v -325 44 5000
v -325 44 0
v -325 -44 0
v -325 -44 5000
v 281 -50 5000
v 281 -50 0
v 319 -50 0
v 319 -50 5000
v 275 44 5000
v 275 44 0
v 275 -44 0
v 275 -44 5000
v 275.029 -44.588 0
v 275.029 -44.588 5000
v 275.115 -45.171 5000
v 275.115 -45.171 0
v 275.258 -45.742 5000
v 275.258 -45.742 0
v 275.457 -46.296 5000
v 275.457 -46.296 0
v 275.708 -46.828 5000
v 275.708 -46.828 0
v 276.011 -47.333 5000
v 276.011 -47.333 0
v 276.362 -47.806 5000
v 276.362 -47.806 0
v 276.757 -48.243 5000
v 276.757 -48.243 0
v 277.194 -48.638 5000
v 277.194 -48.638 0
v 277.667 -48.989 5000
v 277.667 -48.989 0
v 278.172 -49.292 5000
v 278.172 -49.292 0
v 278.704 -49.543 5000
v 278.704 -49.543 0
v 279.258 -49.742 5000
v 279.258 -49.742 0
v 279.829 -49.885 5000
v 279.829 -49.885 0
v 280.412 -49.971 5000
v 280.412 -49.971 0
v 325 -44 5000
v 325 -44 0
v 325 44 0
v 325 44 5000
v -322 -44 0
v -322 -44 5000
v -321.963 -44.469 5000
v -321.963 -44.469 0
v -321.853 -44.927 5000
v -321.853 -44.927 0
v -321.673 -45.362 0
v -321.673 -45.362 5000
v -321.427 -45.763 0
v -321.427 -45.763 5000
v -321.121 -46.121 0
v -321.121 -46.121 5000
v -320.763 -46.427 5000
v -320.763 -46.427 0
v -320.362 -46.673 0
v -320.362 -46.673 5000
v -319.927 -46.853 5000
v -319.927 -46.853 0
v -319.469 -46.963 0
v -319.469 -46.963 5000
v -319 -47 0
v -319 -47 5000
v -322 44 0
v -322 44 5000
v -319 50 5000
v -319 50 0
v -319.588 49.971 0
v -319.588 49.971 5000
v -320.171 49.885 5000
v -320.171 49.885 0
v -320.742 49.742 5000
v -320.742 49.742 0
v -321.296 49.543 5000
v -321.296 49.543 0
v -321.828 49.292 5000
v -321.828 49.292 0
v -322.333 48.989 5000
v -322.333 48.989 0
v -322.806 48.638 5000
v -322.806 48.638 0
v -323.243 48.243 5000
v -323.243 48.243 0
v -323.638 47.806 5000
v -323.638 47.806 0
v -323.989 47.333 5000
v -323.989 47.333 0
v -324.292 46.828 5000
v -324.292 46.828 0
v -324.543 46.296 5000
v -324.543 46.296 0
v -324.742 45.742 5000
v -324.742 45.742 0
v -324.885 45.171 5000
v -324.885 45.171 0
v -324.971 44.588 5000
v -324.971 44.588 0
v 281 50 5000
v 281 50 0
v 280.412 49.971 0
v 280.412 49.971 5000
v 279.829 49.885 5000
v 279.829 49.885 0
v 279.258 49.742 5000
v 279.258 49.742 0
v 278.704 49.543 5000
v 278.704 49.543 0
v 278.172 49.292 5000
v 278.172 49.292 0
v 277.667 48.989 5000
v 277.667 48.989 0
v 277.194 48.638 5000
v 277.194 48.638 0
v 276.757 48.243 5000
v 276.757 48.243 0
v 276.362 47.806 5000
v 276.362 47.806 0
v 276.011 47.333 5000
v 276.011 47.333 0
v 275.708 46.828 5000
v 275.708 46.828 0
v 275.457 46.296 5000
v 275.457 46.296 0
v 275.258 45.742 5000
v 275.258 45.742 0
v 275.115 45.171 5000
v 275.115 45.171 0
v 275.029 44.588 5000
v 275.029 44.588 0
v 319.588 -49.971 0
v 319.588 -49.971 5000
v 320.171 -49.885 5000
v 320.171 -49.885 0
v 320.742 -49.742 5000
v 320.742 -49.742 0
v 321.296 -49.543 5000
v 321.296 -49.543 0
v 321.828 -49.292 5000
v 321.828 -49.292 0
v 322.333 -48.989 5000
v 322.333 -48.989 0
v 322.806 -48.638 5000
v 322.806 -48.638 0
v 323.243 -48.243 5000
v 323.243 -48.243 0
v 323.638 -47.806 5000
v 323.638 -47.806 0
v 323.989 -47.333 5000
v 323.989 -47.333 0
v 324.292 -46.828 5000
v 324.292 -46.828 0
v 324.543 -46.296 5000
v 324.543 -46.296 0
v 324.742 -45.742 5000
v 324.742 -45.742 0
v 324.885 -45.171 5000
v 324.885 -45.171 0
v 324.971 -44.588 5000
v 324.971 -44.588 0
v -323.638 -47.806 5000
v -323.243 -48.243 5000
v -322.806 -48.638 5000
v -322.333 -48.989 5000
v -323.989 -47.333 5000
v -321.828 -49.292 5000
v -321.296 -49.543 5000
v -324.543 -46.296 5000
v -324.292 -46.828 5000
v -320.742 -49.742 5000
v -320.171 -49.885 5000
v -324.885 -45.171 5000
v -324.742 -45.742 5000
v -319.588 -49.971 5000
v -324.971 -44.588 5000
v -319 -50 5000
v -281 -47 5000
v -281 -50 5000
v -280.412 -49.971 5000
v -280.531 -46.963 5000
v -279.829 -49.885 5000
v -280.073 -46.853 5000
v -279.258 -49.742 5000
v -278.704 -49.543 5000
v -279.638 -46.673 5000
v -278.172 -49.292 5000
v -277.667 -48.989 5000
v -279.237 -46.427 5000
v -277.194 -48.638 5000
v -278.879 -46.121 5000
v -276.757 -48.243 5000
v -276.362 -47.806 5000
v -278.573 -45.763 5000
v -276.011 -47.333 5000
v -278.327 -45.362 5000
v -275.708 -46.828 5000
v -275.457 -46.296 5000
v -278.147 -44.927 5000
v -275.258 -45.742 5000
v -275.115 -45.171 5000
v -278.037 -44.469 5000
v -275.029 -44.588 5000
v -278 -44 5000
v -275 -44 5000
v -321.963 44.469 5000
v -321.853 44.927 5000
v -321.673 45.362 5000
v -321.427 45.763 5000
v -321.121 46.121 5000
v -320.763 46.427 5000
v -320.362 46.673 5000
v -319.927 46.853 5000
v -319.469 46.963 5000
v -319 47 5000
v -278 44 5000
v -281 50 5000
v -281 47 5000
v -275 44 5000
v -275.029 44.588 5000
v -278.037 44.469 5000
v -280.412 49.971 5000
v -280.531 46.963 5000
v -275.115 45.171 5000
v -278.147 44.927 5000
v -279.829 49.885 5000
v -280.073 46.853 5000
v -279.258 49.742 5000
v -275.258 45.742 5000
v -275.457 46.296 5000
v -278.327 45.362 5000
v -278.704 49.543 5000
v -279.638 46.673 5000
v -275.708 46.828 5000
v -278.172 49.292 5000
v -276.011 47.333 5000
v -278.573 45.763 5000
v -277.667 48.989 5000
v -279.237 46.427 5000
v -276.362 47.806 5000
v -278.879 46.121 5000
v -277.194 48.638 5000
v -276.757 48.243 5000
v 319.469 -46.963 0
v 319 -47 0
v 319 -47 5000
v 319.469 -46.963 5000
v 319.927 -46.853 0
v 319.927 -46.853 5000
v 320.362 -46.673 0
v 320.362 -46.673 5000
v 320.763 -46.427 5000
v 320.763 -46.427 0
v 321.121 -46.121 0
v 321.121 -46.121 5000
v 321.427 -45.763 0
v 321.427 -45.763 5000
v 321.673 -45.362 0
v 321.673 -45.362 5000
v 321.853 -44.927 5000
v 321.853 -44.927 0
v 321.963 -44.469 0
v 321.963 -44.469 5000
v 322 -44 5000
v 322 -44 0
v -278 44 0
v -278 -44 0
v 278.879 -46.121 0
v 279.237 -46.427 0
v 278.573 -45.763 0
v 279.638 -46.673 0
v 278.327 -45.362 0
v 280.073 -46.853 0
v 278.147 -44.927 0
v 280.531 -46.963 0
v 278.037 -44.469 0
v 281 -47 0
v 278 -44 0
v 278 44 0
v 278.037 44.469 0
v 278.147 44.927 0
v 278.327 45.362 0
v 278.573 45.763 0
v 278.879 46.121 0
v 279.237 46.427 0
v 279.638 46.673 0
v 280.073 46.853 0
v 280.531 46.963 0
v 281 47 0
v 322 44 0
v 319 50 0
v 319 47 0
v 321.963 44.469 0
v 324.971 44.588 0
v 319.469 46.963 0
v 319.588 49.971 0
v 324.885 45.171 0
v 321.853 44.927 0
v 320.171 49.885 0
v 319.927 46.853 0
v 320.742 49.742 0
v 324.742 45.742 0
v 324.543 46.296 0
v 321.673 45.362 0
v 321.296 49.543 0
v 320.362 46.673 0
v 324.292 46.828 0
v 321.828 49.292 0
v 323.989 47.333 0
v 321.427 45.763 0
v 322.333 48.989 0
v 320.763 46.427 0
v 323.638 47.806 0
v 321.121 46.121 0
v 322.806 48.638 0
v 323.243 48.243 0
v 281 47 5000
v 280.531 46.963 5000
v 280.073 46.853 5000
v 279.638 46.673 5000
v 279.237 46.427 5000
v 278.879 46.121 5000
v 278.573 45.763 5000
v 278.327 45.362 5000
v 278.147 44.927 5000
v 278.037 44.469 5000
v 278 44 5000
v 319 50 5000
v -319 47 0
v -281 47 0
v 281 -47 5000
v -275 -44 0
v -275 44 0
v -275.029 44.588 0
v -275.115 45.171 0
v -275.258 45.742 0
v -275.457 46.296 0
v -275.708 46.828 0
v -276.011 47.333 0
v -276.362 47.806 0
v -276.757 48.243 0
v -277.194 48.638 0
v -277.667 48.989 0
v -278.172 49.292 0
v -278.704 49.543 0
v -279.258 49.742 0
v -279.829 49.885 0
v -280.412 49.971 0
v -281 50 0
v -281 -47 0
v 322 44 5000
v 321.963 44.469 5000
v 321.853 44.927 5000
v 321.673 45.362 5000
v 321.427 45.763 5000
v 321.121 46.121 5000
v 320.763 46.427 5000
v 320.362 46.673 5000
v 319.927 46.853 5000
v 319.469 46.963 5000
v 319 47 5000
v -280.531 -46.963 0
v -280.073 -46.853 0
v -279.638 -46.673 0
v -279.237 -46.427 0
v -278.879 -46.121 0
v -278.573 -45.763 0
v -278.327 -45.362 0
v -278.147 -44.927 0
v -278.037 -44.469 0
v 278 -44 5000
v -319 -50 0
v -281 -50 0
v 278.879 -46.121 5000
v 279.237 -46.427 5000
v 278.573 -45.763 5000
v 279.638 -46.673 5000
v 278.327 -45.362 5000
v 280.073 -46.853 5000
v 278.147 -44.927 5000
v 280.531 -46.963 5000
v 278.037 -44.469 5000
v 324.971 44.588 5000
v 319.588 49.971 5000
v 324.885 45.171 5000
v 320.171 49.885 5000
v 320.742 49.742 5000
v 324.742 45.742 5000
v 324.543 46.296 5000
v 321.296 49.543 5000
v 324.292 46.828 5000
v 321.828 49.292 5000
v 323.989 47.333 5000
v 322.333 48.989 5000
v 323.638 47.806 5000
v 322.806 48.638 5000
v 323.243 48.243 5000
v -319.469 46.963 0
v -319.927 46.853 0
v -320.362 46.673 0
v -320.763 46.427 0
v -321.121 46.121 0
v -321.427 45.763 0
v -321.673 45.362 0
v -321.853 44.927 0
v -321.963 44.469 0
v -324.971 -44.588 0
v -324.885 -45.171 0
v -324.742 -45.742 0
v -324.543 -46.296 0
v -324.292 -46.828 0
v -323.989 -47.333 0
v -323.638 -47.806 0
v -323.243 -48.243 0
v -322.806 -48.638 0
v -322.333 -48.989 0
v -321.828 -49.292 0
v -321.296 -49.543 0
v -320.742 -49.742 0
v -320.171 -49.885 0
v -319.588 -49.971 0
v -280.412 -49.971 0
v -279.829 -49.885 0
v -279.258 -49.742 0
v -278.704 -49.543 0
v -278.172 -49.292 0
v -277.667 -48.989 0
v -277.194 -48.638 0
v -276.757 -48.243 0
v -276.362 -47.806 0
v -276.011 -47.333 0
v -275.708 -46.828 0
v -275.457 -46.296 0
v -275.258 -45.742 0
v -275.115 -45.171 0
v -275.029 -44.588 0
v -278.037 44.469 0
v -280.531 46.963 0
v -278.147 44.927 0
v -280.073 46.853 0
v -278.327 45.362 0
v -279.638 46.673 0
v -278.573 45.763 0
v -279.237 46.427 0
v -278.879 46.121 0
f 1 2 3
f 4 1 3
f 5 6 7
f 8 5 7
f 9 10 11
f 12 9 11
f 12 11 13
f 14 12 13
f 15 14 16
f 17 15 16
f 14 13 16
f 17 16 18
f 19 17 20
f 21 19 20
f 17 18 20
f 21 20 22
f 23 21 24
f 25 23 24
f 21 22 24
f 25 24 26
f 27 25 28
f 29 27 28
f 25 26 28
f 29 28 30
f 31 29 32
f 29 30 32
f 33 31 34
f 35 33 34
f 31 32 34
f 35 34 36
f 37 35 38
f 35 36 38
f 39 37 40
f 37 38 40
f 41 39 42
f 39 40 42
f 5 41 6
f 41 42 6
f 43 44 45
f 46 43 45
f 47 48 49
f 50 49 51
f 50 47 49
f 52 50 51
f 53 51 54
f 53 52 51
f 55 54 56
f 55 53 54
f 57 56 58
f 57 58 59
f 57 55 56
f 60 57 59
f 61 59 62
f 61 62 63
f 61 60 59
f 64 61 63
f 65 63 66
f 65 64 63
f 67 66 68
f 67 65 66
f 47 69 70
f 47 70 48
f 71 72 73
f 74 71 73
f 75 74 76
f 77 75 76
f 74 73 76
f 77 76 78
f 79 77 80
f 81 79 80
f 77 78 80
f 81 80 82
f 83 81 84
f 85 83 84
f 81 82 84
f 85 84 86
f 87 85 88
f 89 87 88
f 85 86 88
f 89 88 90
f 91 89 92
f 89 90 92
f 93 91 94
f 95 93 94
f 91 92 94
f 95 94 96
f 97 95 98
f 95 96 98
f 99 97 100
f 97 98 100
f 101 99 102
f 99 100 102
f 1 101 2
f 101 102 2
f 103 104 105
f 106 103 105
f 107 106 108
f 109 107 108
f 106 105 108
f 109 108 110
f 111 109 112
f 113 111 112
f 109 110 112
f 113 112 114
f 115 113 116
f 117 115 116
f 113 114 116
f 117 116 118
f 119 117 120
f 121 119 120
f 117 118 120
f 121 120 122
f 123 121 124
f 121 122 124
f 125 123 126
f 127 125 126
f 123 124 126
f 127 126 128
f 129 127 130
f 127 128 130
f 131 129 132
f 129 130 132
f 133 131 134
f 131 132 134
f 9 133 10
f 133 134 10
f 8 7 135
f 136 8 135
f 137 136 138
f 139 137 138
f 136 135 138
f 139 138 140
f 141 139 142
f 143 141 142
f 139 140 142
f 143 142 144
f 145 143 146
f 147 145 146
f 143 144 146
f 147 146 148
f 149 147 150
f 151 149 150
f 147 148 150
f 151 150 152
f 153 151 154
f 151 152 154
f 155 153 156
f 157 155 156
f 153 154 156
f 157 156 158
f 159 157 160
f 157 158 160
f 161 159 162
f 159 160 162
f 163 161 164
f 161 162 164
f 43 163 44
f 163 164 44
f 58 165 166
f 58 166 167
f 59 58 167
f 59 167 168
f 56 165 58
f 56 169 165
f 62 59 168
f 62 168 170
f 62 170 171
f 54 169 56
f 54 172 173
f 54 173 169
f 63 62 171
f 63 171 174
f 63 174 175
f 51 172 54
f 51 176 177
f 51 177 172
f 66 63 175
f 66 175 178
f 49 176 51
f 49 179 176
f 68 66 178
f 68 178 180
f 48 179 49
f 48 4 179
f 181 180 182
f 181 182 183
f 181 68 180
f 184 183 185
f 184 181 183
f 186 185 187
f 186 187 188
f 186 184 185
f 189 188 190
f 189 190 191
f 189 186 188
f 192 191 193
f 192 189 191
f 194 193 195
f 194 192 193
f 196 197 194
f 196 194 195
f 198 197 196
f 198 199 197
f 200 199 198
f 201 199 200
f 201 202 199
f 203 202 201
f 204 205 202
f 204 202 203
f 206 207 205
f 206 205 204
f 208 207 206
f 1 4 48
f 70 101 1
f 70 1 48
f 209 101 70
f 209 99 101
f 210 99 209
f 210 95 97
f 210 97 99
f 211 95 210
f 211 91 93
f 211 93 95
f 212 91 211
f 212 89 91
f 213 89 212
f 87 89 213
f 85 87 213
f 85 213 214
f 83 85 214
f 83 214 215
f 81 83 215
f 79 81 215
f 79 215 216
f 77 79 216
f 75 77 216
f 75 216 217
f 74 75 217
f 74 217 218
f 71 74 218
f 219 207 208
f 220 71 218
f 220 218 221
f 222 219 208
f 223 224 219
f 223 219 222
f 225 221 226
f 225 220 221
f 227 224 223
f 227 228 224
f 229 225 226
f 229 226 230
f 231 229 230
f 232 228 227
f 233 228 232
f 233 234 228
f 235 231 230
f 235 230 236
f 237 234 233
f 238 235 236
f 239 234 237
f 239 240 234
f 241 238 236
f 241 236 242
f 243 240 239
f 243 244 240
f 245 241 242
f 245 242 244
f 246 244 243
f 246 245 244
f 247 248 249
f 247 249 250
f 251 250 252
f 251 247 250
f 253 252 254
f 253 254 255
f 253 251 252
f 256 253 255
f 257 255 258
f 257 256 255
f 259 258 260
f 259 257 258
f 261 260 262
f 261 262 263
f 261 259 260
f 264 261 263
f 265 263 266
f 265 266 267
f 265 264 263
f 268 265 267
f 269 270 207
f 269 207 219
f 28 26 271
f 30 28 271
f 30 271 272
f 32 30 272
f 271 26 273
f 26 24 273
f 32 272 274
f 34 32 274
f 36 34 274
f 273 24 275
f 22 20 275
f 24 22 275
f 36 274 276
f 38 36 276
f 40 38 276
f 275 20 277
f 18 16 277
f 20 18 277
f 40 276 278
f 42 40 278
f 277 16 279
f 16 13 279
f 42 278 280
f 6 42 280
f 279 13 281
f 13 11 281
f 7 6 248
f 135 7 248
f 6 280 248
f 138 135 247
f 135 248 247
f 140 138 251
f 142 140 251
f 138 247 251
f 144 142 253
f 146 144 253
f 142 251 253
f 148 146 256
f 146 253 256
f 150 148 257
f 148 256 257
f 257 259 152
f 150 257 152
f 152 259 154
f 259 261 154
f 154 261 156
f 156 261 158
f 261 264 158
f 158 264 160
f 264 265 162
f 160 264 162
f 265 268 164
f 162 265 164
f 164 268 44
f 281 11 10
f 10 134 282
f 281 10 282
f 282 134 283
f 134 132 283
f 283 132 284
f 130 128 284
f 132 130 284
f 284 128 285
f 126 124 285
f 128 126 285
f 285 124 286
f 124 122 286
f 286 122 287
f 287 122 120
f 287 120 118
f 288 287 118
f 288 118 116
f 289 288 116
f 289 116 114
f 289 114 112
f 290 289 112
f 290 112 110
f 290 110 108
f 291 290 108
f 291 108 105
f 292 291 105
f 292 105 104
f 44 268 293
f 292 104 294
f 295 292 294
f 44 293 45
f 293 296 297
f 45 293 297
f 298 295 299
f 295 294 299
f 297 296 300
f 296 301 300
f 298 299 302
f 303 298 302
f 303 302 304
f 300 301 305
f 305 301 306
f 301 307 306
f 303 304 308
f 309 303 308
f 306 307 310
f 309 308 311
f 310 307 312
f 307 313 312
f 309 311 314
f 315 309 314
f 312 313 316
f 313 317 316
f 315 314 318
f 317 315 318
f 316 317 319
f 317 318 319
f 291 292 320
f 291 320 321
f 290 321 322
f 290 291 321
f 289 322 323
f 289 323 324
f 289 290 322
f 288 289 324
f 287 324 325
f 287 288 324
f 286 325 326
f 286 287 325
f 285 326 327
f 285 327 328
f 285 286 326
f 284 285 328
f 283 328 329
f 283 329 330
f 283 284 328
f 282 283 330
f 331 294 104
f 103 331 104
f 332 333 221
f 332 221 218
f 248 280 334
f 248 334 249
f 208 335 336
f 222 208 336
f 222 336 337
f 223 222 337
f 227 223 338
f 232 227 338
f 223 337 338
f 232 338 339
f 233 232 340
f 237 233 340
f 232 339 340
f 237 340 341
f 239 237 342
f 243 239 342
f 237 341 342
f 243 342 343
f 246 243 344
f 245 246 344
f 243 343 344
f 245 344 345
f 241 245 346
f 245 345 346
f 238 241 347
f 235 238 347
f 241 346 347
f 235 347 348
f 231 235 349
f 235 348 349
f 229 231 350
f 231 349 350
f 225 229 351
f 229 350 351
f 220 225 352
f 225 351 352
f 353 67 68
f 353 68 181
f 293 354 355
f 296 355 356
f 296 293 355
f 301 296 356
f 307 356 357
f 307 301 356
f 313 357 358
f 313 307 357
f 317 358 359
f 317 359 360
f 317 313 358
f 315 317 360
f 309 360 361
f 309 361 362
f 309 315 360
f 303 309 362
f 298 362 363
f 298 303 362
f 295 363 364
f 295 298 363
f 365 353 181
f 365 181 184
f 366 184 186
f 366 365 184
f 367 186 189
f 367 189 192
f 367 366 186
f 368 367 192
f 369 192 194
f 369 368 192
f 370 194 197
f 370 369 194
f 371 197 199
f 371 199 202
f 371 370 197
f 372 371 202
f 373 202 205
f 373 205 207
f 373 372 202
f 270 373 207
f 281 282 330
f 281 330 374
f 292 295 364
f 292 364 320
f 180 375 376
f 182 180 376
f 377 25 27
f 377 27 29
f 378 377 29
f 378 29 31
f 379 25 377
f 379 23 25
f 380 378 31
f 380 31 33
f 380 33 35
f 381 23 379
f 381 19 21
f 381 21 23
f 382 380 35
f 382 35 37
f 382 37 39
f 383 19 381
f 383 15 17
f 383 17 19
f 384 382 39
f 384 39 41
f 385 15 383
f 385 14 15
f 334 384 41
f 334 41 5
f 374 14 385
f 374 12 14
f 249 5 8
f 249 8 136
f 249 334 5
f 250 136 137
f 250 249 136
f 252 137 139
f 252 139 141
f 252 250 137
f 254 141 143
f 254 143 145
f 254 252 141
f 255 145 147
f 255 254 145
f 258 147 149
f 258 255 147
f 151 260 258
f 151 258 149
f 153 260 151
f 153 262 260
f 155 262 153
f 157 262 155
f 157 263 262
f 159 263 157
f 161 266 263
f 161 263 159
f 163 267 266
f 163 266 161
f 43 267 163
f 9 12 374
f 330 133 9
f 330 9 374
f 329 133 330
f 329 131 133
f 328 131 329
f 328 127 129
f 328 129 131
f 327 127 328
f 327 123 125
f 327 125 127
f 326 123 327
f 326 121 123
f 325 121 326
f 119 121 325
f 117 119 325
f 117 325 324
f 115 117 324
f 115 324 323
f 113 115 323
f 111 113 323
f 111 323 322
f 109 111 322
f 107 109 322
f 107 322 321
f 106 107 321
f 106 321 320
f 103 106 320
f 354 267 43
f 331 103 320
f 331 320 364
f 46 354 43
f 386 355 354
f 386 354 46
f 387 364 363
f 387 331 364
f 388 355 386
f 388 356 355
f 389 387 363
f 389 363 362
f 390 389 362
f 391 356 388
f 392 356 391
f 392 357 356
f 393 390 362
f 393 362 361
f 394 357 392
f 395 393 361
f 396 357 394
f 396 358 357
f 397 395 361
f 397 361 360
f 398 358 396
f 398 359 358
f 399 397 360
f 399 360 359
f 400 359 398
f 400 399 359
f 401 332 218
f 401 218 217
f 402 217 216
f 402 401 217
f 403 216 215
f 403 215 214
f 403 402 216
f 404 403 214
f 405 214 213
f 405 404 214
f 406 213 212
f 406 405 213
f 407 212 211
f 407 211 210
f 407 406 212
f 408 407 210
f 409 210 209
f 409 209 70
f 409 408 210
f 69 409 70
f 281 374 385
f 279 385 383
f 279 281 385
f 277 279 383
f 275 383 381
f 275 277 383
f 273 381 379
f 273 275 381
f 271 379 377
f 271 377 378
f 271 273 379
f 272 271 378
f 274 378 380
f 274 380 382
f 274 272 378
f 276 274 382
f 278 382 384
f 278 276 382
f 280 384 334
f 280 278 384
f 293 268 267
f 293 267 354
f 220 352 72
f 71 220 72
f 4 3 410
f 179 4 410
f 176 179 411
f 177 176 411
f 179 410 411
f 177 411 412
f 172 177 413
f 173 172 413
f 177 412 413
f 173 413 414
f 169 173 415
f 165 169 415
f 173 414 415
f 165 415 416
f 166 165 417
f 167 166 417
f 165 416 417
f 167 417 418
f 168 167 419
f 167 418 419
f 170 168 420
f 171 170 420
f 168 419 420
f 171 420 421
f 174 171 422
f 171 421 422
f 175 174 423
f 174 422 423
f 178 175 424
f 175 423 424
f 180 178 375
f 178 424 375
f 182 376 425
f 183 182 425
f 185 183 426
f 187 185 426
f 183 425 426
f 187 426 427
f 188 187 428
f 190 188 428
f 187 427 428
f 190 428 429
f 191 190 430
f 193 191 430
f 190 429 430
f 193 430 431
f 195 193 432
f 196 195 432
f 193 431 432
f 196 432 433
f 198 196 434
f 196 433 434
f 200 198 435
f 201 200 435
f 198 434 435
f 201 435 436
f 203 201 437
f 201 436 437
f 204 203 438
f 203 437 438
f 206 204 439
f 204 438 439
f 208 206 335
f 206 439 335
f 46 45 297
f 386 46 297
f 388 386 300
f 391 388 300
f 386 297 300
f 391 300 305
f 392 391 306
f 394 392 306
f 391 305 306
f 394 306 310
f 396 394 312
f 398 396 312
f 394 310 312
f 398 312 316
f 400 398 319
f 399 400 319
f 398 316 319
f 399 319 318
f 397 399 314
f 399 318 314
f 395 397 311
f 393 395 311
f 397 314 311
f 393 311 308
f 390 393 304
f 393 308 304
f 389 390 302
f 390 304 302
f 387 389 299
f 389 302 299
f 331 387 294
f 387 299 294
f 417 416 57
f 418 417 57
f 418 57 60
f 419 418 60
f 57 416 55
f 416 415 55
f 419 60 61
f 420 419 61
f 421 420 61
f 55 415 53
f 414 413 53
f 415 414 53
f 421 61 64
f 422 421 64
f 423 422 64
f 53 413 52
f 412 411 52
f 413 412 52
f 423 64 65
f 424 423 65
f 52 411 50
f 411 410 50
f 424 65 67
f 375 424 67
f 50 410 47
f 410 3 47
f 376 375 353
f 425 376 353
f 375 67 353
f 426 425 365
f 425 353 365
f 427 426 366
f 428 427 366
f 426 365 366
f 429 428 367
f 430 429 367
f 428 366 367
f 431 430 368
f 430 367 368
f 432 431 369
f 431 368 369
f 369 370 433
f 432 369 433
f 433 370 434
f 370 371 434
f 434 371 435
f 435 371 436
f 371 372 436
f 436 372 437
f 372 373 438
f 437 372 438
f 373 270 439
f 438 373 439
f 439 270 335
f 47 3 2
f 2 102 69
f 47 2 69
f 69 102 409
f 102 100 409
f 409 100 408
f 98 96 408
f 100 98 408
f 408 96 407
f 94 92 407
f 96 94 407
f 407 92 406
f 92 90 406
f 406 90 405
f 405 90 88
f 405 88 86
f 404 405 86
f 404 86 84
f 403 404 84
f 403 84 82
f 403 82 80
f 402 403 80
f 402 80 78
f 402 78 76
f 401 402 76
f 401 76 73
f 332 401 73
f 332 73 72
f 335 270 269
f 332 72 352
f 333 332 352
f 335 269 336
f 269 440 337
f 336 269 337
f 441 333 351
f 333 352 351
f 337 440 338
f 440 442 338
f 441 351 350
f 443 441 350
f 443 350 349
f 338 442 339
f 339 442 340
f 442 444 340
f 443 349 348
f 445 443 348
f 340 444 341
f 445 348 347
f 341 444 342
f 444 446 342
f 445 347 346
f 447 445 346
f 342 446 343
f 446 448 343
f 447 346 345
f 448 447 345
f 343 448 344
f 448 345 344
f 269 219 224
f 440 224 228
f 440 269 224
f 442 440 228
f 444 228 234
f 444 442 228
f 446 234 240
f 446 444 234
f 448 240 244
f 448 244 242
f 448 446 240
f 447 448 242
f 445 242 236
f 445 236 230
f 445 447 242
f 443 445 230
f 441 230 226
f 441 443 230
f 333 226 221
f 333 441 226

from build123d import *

# Parameters (mm, degrees)
TWO_RAILS_PROTOTYPE_DEPTH   = 5000
TWO_RAILS_PROTOTYPE_2_DEPTH = 5000


with BuildPart() as part:
    # PROFILE_100_50_3_R6_FIXED → TWO_RAILS_PROTOTYPE (new body)
    with BuildSketch(Plane.XY):
        with BuildLine():
            Line((-319, -50), (-281, -50))
            ThreePointArc((-281, -50), (-276.757359313, -48.242640687), (-275, -44))
            Line((-275, -44), (-275, 44))
            ThreePointArc((-275, 44), (-276.757359313, 48.242640687), (-281, 50))
            Line((-281, 50), (-319, 50))
            ThreePointArc((-319, 50), (-323.242640687, 48.242640687), (-325, 44))
            Line((-325, 44), (-325, -44))
            ThreePointArc((-325, -44), (-323.242640687, -48.242640687), (-319, -50))
        make_face()
        with BuildLine():
            Line((-319, -47), (-281, -47))
            ThreePointArc((-281, -47), (-278.878679656, -46.121320344), (-278, -44))
            Line((-278, -44), (-278, 44))
            ThreePointArc((-278, 44), (-278.878679656, 46.121320344), (-281, 47))
            Line((-281, 47), (-319, 47))
            ThreePointArc((-319, 47), (-321.121320344, 46.121320344), (-322, 44))
            Line((-322, 44), (-322, -44))
            ThreePointArc((-322, -44), (-321.121320344, -46.121320344), (-319, -47))
        make_face(mode=Mode.SUBTRACT)
    extrude(amount=TWO_RAILS_PROTOTYPE_DEPTH)


with BuildPart() as body_2:
    # PROFILE_100_50_3_R6_FIXED → TWO_RAILS_PROTOTYPE 2 (new body)
    with BuildSketch(Plane.XY):
        with BuildLine():
            Line((281, -50), (319, -50))
            ThreePointArc((319, -50), (323.242640687, -48.242640687), (325, -44))
            Line((325, -44), (325, 44))
            ThreePointArc((325, 44), (323.242640687, 48.242640687), (319, 50))
            Line((319, 50), (281, 50))
            ThreePointArc((281, 50), (276.757359313, 48.242640687), (275, 44))
            Line((275, 44), (275, -44))
            ThreePointArc((275, -44), (276.757359313, -48.242640687), (281, -50))
        make_face()
        with BuildLine():
            Line((281, -47), (319, -47))
            ThreePointArc((319, -47), (321.121320344, -46.121320344), (322, -44))
            Line((322, -44), (322, 44))
            ThreePointArc((322, 44), (321.121320344, 46.121320344), (319, 47))
            Line((319, 47), (281, 47))
            ThreePointArc((281, 47), (278.878679656, 46.121320344), (278, 44))
            Line((278, 44), (278, -44))
            ThreePointArc((278, -44), (278.878679656, -46.121320344), (281, -47))
        make_face(mode=Mode.SUBTRACT)
    extrude(amount=TWO_RAILS_PROTOTYPE_2_DEPTH)


solid = Compound([part.part, body_2.part])
